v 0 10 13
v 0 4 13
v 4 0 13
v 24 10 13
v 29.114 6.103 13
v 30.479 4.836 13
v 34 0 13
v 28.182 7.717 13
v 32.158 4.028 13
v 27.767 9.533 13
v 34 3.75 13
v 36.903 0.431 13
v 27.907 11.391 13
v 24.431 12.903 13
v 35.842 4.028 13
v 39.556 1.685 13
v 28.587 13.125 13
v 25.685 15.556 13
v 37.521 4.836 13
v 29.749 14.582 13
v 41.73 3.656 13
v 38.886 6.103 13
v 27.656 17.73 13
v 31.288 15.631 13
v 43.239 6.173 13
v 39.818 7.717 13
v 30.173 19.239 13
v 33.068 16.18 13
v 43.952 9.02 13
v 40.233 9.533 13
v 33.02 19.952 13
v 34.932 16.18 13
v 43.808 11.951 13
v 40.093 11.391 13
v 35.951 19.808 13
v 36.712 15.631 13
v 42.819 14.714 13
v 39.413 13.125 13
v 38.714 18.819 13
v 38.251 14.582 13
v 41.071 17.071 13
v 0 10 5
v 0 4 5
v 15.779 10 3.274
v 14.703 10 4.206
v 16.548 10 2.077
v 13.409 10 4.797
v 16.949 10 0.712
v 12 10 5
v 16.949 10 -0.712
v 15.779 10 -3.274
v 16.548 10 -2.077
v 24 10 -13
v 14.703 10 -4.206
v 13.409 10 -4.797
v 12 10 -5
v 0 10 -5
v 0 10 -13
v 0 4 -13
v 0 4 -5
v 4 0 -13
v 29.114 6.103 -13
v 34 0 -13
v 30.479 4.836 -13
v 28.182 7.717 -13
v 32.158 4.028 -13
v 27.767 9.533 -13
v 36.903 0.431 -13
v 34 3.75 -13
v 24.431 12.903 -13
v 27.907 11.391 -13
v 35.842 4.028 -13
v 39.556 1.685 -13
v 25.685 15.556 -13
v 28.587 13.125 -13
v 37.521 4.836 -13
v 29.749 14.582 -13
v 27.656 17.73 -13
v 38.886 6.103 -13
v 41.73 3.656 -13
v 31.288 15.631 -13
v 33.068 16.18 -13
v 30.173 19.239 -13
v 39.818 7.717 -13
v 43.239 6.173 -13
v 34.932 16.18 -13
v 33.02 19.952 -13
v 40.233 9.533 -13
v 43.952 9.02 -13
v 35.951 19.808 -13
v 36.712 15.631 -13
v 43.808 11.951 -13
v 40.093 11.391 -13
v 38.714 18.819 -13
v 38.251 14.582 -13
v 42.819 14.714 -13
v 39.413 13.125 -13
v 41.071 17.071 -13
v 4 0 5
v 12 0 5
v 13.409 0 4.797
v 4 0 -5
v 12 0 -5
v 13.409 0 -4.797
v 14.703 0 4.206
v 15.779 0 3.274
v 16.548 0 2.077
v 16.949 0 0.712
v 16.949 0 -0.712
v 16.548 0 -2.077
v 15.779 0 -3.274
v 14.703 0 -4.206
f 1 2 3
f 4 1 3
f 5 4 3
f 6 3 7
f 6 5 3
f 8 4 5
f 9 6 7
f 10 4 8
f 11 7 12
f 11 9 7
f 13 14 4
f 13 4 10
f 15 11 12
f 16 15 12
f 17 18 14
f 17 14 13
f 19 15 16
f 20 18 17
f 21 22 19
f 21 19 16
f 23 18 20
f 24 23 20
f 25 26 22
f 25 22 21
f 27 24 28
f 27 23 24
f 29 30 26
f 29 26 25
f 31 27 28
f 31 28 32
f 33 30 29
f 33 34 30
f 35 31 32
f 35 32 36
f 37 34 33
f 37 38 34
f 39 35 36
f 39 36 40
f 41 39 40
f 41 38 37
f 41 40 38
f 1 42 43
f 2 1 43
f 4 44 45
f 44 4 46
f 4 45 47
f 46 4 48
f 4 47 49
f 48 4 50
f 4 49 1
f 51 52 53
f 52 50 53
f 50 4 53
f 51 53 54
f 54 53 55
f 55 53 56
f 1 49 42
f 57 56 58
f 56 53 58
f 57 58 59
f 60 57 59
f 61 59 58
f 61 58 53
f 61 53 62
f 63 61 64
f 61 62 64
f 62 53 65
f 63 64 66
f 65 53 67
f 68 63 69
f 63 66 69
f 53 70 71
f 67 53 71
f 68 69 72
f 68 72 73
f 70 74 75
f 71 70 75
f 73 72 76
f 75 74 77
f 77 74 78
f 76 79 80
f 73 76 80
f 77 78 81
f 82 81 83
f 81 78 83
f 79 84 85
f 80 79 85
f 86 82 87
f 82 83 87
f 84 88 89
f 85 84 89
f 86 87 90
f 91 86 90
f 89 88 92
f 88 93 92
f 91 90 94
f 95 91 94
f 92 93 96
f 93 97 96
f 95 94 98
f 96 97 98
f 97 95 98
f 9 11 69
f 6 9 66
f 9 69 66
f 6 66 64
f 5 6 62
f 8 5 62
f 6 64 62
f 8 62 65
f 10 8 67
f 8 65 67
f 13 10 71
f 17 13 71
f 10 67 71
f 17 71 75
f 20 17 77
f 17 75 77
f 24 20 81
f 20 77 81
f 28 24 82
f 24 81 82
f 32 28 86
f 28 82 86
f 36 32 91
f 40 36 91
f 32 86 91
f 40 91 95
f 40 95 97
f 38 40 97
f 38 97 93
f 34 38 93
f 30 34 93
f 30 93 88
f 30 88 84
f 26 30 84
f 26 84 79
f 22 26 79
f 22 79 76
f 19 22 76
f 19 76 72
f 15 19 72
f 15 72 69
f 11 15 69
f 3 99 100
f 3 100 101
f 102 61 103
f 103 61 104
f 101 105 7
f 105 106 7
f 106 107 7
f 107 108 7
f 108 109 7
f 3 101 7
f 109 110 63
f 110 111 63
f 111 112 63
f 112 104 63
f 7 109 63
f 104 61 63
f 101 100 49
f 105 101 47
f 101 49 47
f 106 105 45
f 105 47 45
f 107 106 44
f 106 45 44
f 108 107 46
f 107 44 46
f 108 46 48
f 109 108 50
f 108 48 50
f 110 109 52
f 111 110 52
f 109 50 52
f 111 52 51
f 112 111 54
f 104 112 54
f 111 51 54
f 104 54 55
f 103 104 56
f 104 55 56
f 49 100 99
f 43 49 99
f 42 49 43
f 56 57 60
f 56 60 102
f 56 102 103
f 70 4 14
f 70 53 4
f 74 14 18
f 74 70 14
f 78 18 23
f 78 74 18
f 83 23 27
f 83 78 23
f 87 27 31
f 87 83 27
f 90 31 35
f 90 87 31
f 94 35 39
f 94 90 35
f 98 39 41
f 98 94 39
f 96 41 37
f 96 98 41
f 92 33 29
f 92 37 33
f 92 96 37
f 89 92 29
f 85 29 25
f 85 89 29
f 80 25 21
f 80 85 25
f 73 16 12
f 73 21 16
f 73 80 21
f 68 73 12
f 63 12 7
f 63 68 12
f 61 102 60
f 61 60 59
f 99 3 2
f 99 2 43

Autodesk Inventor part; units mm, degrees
ref_plane "YZ Plane" through (0, 0, 0) normal (1, 0, 0) x (0, 1, 0)
ref_plane "XZ Plane" through (0, 0, 0) normal (0, 1, 0) x (-1, 0, 0)
ref_plane "XY Plane" through (0, 0, 0) normal (0, 0, 1) x (1, 0, 0)
sketch "Szkic1" plane through (0, 0, 0) normal (0, 0, 1) x (1, 0, 0)
  line L0 (0, 0) -> (34, 0)
  line L1 (34, 0) -> (34, 10)
  line L2 (34, 10) -> (0, 10)
  line L3 (0, 10) -> (0, 0)
  circle A0 centre (34, 10) radius 10
  point P0 (24, 10)
  dimension "d0" = 34
  dimension "d1" = 10
  dimension "d2" = 20
extrude "Wyciągnięcie proste1" add sketch "Szkic1" along normal mid plane 26
chamfer "Faza1" distance 4 angle 45 1 edges at (0, 0, 0)
sketch "Szkic2" plane through (0, 0, 13) normal (0, 0, 1) x (1, 0, 0)
  arc A0 (34, 0) -> (24, 10) centre (34, 10) ccw projected
  point P0 (0, 0)
hole "Otwór1" at (34, 10, 13) direction (0, 0, -1) diameter 12.5 end through all
sketch "Szkic3" plane through (0, 10, 13) normal (0, 1, 0) x (1, 0, 0)
  line L0 (0, 18) -> (12, 18)
  line L1 (12, 18) -> (12, 8)
  line L2 (12, 8) -> (0, 8)
  line L3 (0, 8) -> (0, 18)
  circle A0 centre (12, 13) radius 5
  point P0 (0, 13)
extrude "Wyciągnięcie proste2" cut sketch "Szkic3" against normal through all
